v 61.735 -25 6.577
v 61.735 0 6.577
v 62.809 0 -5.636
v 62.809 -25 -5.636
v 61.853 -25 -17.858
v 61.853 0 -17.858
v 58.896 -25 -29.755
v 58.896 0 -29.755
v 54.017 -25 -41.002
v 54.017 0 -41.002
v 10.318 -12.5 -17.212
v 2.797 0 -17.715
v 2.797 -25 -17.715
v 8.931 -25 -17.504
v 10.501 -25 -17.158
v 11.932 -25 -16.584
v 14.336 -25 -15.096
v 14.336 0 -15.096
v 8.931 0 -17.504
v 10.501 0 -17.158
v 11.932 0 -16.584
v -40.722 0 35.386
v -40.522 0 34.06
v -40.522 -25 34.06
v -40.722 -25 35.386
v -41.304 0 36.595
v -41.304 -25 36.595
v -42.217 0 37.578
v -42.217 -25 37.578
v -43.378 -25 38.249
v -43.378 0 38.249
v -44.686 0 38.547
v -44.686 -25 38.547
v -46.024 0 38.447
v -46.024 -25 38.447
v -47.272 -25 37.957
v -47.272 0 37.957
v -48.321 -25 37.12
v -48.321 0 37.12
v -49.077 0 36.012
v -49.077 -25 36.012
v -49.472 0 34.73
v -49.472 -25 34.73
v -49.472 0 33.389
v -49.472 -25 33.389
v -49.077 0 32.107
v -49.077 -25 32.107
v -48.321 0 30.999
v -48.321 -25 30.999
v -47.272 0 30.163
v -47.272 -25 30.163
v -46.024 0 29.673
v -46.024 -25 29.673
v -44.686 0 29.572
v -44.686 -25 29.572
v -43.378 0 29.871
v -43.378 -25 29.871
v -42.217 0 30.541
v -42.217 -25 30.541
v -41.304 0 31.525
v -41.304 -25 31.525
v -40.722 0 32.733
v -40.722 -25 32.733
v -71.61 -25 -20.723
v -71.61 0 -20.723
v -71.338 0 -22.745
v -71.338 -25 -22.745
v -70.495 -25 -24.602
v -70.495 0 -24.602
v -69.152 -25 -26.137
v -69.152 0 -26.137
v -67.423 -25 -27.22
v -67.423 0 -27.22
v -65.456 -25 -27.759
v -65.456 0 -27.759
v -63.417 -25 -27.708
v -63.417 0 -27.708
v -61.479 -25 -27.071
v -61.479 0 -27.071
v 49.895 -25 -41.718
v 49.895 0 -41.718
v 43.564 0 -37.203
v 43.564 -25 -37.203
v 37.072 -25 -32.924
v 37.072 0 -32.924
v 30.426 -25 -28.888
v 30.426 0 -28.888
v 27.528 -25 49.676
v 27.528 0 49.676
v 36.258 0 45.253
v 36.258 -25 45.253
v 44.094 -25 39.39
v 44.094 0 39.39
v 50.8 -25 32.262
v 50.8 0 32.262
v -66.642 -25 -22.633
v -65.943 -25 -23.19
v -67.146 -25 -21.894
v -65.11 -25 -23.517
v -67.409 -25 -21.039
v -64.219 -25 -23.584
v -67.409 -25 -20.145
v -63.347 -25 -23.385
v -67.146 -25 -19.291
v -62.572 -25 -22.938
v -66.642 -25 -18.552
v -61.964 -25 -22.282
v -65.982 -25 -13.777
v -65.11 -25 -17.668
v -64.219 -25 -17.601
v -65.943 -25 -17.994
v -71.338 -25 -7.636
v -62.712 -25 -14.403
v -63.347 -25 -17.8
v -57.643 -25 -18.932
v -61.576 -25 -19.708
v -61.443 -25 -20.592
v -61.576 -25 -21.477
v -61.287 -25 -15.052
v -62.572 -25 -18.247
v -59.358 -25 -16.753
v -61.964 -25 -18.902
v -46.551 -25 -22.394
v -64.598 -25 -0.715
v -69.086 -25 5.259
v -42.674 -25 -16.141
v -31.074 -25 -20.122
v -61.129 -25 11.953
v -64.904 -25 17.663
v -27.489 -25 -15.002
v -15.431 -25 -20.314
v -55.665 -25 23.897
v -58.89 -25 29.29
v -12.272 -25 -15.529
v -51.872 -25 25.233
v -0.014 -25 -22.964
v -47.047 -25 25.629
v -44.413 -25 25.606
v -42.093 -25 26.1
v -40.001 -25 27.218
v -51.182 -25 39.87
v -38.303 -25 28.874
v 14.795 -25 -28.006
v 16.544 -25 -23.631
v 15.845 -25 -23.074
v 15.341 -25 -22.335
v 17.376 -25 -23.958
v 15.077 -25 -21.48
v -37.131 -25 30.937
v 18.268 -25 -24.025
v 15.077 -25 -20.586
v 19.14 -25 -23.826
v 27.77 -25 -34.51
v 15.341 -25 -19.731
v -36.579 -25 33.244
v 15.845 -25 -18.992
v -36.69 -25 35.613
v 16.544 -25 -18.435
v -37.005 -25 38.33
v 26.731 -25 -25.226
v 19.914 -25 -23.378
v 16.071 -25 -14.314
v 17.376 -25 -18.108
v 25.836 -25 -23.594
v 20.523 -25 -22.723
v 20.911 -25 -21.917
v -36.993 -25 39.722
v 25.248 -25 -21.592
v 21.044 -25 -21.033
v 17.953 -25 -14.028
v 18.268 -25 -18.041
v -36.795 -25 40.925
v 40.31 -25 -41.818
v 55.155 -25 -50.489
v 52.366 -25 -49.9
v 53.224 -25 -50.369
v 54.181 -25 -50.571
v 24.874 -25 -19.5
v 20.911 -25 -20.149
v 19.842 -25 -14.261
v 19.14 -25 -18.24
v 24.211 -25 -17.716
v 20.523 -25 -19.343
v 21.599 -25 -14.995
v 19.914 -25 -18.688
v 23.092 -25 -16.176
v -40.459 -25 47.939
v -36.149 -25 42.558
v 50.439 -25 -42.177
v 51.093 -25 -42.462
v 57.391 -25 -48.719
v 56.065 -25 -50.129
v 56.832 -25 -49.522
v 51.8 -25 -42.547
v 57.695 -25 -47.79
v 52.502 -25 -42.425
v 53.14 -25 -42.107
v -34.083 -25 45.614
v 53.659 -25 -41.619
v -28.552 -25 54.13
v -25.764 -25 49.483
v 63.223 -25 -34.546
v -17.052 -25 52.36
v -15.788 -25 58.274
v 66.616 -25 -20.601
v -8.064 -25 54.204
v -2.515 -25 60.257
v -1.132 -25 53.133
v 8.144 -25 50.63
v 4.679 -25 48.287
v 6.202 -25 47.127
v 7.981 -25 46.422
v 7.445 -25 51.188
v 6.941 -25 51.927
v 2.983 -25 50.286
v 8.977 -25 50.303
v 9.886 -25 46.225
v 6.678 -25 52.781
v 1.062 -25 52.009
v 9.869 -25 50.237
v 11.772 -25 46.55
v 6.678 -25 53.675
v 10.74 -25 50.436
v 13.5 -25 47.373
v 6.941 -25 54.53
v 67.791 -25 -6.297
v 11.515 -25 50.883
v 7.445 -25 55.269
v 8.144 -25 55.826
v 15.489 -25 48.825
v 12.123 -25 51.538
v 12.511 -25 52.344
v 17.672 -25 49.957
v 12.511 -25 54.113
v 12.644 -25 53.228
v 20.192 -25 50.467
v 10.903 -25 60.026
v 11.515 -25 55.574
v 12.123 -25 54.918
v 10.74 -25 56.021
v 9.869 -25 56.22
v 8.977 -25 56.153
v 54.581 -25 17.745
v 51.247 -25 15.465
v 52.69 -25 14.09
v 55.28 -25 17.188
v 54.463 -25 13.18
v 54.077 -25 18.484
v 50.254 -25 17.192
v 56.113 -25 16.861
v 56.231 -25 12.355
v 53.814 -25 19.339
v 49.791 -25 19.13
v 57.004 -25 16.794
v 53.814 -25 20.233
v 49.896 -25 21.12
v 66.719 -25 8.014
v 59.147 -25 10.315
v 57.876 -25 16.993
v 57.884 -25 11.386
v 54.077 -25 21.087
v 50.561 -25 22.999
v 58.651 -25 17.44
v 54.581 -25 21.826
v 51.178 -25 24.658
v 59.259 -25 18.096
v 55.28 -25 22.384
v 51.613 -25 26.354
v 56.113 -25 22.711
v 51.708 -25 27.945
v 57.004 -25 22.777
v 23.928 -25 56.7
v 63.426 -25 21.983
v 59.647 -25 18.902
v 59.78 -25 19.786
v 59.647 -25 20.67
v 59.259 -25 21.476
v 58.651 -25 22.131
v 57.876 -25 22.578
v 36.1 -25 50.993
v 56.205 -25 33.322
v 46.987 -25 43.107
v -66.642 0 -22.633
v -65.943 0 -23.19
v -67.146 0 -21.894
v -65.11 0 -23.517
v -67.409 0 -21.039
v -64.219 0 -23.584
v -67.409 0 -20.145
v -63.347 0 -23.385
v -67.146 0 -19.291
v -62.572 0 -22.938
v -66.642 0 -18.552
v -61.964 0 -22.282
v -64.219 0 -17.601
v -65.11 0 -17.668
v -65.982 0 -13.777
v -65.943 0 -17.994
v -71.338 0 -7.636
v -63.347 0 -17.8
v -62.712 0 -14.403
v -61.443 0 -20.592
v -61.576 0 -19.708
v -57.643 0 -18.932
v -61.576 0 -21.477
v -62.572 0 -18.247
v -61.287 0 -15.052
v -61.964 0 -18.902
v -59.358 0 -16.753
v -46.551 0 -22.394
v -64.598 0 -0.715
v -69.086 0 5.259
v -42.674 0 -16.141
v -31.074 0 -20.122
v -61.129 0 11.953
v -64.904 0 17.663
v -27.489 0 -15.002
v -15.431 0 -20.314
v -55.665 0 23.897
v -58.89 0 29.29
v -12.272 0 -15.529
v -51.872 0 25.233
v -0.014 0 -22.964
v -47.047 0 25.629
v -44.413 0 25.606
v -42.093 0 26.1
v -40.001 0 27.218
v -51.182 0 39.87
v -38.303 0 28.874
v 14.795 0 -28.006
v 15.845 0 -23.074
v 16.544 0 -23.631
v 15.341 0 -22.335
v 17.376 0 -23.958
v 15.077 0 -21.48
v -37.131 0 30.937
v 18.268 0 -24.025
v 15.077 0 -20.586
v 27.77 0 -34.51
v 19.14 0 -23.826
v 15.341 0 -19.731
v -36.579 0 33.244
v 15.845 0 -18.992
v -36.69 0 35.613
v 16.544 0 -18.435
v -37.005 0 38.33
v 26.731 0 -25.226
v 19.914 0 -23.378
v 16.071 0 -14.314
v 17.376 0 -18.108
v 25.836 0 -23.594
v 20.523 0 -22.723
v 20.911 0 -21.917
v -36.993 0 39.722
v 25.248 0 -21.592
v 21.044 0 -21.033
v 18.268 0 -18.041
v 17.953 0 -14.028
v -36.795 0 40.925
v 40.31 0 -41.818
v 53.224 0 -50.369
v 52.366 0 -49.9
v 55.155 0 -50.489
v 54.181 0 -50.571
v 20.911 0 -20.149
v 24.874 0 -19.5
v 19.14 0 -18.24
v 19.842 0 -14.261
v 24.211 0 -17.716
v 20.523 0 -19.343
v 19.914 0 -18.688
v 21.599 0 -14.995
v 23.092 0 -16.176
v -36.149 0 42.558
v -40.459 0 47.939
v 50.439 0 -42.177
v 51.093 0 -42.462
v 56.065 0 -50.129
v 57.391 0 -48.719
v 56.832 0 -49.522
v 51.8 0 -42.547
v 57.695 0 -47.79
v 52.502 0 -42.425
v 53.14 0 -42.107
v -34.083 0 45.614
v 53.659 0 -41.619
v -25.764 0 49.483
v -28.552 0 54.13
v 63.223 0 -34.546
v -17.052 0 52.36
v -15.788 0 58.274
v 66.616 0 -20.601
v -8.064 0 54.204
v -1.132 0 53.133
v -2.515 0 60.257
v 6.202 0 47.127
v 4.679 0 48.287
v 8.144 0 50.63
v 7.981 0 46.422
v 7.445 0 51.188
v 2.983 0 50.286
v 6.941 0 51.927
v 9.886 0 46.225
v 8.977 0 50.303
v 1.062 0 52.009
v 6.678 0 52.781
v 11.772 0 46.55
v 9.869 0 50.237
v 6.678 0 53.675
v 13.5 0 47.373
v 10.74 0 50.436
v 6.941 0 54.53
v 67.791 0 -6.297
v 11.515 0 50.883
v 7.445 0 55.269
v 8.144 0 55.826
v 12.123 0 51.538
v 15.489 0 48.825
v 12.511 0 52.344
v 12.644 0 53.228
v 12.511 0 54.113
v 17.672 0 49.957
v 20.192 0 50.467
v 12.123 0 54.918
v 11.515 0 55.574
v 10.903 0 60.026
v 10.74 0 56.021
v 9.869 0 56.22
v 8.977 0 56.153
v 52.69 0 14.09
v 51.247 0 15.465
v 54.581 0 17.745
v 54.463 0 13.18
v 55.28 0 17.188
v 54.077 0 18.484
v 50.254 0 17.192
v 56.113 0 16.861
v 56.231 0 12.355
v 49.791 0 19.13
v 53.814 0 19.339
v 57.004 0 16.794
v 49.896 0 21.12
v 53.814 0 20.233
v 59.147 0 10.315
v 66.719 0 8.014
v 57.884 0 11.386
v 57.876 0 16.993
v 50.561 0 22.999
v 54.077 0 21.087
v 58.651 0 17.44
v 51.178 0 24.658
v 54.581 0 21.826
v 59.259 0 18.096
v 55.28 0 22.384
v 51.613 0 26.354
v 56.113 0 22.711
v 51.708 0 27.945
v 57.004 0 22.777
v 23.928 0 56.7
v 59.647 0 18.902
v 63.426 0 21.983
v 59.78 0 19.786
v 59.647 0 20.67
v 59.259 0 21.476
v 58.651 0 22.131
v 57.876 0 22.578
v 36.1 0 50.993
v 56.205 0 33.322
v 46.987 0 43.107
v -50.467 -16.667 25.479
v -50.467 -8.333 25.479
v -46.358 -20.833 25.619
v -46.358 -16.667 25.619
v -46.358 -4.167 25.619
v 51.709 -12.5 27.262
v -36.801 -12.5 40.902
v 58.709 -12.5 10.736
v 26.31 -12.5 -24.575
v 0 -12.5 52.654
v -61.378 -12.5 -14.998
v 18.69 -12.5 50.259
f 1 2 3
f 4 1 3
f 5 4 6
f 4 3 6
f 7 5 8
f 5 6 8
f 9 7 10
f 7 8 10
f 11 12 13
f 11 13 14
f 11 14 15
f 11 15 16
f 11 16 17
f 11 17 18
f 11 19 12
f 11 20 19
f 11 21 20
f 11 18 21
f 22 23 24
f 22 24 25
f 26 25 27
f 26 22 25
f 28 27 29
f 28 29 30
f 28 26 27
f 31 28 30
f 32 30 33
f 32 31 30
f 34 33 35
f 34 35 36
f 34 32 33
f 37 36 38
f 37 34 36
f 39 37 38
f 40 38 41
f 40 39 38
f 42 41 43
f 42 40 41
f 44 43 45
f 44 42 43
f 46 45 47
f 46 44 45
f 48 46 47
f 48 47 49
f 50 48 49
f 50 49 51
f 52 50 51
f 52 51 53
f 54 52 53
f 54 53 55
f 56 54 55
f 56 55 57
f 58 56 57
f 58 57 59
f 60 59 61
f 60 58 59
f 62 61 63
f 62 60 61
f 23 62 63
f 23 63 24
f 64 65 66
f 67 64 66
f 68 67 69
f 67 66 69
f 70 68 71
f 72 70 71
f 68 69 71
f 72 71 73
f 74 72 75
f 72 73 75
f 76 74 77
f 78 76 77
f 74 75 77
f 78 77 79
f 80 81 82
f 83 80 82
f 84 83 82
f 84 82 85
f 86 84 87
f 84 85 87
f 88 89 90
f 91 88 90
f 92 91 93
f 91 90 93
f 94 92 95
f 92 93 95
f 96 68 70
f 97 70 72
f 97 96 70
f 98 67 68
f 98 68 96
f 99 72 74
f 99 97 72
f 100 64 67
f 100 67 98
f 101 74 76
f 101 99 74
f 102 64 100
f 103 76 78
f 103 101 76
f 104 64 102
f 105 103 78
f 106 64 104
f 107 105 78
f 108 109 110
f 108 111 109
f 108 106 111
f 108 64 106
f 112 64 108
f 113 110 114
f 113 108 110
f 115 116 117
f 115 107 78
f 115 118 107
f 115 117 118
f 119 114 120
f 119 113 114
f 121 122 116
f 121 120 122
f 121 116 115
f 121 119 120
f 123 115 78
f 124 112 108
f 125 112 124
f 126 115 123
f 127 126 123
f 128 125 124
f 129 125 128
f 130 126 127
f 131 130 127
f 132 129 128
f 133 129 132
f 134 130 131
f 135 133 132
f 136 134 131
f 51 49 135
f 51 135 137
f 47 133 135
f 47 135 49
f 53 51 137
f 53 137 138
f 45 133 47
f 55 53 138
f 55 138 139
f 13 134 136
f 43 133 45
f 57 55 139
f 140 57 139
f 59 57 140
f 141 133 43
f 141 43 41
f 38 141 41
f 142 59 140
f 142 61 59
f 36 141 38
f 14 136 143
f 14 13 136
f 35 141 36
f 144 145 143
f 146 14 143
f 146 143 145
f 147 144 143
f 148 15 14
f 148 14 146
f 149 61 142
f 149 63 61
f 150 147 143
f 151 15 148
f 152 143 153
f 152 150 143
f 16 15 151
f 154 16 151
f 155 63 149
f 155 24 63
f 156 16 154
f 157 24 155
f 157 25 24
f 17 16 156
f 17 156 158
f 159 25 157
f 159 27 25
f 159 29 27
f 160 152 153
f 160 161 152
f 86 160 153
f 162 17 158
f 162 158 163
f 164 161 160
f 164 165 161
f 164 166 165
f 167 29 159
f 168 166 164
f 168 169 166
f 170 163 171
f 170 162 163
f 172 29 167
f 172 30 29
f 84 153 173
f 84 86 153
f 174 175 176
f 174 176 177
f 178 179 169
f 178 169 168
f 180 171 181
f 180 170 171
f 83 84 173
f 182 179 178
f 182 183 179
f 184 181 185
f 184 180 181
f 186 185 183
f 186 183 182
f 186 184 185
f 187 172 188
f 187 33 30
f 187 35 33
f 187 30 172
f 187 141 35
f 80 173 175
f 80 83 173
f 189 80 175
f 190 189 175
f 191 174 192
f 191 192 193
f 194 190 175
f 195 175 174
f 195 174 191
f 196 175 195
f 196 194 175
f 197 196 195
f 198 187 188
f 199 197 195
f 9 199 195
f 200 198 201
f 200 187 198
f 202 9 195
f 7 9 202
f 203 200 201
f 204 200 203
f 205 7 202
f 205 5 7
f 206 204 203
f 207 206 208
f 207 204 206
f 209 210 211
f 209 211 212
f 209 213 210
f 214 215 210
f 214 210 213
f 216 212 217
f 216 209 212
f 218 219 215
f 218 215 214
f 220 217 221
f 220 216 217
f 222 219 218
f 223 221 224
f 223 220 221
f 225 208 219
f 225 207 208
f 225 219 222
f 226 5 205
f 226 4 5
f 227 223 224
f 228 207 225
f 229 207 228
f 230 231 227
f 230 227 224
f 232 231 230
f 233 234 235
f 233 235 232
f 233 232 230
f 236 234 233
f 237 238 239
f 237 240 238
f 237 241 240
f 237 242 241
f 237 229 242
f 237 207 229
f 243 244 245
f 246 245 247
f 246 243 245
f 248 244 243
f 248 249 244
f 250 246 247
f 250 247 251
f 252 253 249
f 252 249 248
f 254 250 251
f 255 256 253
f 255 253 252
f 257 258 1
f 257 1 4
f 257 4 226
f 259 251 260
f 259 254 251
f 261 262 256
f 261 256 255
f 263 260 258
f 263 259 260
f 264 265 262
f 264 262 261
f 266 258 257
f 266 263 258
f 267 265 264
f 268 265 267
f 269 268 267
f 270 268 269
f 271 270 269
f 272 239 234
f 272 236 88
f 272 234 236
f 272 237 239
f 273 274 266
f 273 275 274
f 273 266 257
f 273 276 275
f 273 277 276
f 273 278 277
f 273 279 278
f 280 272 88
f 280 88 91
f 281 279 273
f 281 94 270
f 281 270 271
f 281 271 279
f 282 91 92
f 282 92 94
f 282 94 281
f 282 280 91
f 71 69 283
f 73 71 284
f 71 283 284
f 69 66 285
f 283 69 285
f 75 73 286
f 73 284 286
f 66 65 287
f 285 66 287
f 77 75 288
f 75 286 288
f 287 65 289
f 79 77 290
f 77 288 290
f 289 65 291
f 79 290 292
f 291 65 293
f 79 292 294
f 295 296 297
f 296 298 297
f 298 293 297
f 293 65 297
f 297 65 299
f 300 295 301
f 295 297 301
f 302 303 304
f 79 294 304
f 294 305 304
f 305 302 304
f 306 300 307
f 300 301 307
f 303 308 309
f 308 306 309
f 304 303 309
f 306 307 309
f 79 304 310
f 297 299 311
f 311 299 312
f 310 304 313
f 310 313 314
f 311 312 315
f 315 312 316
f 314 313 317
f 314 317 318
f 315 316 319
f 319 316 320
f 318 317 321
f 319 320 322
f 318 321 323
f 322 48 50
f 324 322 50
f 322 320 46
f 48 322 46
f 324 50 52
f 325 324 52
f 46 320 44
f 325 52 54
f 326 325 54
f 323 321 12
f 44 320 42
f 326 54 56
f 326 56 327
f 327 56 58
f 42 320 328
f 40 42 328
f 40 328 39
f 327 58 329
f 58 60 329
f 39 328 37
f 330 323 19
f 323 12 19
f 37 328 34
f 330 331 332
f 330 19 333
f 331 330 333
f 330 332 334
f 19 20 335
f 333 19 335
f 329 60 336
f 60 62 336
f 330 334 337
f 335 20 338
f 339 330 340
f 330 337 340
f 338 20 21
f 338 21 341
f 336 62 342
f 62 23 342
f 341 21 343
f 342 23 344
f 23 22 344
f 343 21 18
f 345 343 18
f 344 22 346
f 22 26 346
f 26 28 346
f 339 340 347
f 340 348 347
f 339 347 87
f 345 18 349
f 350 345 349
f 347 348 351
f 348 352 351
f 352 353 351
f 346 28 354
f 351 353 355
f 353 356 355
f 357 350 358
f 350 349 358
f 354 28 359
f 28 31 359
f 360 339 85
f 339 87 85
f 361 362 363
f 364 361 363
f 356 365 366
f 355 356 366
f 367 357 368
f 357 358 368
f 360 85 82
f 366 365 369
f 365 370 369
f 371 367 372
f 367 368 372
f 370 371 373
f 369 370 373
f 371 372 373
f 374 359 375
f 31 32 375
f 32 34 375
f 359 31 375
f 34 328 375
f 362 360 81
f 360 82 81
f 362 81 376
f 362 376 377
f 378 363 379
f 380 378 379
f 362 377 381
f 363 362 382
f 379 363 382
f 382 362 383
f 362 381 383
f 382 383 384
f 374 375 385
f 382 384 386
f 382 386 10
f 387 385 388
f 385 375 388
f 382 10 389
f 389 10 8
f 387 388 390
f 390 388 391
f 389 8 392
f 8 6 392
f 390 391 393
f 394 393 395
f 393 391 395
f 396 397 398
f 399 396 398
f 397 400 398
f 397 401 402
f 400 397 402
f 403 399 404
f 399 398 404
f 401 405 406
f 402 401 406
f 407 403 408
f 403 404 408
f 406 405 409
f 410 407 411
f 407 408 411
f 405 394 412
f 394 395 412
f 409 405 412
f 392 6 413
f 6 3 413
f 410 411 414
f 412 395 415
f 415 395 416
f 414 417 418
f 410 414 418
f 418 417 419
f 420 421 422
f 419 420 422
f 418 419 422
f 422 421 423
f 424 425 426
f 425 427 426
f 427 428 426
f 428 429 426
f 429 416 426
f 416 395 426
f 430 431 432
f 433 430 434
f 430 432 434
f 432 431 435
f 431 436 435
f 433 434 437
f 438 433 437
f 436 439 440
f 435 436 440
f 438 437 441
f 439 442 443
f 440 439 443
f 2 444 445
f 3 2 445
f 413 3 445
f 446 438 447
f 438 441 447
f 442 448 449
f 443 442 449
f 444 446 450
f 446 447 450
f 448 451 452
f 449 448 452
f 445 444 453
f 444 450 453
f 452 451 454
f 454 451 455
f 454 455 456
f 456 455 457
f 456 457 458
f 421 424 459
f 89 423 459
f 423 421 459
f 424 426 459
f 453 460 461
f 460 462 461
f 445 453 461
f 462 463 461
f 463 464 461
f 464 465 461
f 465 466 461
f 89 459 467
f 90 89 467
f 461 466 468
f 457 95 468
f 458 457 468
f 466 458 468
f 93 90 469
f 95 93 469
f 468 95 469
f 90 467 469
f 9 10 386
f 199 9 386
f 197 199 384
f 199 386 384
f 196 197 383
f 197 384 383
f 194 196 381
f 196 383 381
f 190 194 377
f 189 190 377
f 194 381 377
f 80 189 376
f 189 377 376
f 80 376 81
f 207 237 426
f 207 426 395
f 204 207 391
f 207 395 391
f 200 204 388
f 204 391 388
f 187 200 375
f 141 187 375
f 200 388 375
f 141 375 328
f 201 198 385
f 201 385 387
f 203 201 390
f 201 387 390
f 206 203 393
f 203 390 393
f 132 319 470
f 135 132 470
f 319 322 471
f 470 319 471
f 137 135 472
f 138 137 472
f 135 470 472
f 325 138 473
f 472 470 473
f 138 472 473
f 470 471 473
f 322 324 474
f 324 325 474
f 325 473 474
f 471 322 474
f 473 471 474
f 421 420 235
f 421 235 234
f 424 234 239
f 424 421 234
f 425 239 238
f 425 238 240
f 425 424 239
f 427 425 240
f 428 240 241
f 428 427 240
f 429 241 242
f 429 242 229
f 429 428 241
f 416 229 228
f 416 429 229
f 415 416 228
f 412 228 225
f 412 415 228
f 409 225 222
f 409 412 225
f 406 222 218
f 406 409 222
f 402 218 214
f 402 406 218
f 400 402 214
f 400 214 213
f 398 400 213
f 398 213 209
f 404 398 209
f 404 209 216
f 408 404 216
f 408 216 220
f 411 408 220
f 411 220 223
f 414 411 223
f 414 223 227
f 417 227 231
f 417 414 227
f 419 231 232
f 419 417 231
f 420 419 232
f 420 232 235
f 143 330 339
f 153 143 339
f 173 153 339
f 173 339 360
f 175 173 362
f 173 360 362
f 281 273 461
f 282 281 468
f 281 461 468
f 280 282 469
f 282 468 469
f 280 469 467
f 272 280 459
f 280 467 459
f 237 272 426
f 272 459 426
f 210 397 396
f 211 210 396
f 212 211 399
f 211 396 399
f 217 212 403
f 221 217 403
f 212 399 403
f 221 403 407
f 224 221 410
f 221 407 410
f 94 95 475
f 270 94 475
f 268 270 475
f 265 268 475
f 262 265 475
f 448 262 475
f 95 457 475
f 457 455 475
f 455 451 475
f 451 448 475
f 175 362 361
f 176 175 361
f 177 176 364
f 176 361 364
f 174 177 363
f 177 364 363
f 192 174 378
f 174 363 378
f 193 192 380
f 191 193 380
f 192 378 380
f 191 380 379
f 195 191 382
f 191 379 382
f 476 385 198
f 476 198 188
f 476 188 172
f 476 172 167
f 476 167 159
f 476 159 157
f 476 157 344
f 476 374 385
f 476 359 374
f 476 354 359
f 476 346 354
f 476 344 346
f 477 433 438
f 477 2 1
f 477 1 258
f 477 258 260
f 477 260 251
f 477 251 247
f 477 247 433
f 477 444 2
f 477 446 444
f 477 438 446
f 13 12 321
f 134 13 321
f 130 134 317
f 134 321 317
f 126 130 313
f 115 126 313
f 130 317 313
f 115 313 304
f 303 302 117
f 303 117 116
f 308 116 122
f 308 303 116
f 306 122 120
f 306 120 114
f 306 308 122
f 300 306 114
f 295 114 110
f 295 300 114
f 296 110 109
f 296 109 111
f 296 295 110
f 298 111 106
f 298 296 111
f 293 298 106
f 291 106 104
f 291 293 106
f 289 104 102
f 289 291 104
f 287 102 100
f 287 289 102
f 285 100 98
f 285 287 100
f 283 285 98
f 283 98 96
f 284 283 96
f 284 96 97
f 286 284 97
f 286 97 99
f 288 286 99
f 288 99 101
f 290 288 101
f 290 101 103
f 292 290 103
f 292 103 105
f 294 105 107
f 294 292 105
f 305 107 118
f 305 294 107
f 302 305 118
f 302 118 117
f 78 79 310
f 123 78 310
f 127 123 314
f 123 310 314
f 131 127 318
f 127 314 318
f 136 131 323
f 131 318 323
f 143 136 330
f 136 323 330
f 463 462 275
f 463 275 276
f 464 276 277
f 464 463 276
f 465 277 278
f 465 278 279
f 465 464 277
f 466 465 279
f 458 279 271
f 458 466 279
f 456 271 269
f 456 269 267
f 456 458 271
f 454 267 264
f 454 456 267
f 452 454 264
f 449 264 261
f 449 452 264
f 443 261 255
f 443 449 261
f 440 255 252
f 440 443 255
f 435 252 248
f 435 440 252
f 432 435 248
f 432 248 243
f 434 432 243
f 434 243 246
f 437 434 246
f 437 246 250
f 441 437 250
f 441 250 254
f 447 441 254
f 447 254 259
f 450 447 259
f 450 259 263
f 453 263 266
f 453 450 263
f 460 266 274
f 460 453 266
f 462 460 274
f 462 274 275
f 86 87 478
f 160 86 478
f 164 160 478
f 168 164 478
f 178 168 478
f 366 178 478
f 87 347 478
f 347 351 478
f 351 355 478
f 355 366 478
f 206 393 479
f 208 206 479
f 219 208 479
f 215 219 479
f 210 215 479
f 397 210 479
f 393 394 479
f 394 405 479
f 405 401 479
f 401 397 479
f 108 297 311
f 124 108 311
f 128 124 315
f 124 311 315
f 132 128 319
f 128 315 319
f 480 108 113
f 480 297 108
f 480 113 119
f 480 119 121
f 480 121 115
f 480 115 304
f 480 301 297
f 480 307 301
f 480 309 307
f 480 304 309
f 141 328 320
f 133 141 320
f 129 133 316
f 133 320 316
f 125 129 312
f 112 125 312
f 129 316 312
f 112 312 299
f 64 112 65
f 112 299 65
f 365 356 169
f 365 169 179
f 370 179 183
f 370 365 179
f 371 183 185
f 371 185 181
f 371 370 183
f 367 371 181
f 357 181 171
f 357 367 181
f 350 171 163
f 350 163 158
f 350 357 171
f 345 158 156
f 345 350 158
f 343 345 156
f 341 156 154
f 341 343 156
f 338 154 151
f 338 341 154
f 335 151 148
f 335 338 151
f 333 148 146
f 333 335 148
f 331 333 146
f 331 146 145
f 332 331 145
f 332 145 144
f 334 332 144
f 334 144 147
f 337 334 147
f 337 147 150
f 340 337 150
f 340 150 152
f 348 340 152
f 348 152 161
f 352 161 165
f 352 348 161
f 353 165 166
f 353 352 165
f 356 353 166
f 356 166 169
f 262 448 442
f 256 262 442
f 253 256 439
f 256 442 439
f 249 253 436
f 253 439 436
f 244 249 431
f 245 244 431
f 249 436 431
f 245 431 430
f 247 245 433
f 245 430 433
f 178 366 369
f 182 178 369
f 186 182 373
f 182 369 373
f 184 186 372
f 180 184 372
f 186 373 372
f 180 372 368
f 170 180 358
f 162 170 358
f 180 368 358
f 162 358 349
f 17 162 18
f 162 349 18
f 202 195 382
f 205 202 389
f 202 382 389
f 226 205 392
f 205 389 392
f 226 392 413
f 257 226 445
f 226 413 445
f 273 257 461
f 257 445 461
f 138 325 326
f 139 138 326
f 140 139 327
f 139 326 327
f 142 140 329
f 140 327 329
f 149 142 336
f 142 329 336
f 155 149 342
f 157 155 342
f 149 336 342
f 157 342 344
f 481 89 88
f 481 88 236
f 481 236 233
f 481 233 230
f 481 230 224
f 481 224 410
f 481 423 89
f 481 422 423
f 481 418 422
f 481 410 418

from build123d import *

# Parameters (mm, degrees)
F0_R     = 3
F0_R_2   = 4.5
F1_DEPTH = 25


with BuildPart() as f1:
    # F0 (on Front) → F1 (new body)
    with BuildSketch(Plane.XZ):
        with BuildLine():
            ThreePointArc((10.9026810919, 60.0256923786), (-22.2558754476, 56.4666978044), (-51.1818335692, 39.870154161))
            ThreePointArc((-51.1818335692, 39.870154161), (-67.2310606154, 11.5408714989), (-71.6096891644, -20.7229403799))
            ThreePointArc((-71.6096891644, -20.7229403799), (-68.3273517642, -26.7421593589), (-61.4792606521, -27.0713766838))
            ThreePointArc((-61.4792606521, -27.0713766838), (-23.2487235956, -19.9089821225), (14.7948054645, -28.00612706))
            ThreePointArc((14.7948054645, -28.00612706), (34.09763812, -38.0650715452), (52.3656483576, -49.8998302939))
            ThreePointArc((52.3656483576, -49.8998302939), (55.6232730928, -50.3420263302), (57.6954634801, -47.7898344783))
            ThreePointArc((57.6954634801, -47.7898344783), (67.4841016349, -13.4719946795), (63.4264131289, 21.9831421749))
            ThreePointArc((63.4264131289, 21.9831421749), (41.7291215347, 47.3065311635), (10.9026810919, 60.0256923786))
        make_face()
        with Locations((-64.4427245231, -20.592329134)):
            Circle(F0_R, mode=Mode.SUBTRACT)
        with Locations((18.0438014374, -21.0330026143)):
            Circle(F0_R, mode=Mode.SUBTRACT)
        with Locations((-45.0222906279, 34.0597224955)):
            Circle(F0_R_2, mode=Mode.SUBTRACT)
        with BuildLine():
            add(Edge.make_bspline(
                [(-65.9818429495, -13.7766383887), (-64.3561406503, -13.9889919324), (-61.002475647, -14.4129805983), (-58.786662695, -17.3941098492), (-57.6425891256, -18.9315586575)],
                knots=[0, 0, 0, 0, 0.4837523045, 1, 1, 1, 1], degree=3))
            ThreePointArc((-65.9818429495, -13.7766383887), (-63.1199927656, 5.6889897511), (-55.6653674819, 23.8969393125))
            add(Edge.make_bspline(
                [(-55.6653674819, 23.8969393125), (-54.1157834703, 24.558722907), (-50.9743628562, 25.897077509), (-44.9169668051, 25.5411930836), (-44.499564984, 25.5987820264), (-44.4126954758, 25.6059592173)],
                knots=[0, 0, 0, 0, 0.4368464907, 0.8829086428, 1, 1, 1, 1], degree=3))
            ThreePointArc((-44.4126954758, 25.6059592173), (-38.3027773263, 28.8742935487), (-36.6900921562, 35.6131625664))
            add(Edge.make_bspline(
                [(-34.08346527, 45.6139450583), (-35.2318735073, 44.1052978146), (-37.495431158, 41.0832942182), (-36.9568434928, 37.4300314786), (-36.6900921562, 35.6131625664)],
                knots=[0, 0, 0, 0, 0.5034654691, 1, 1, 1, 1], degree=3))
            ThreePointArc((-34.08346527, 45.6139450583), (-21.4497726915, 51.0485334301), (-8.0636271487, 54.2038537692))
            add(Edge.make_bspline(
                [(-8.0636271487, 54.2038537692), (-5.1314488098, 53.9873966847), (0.3914162184, 53.5818086349), (3.3084081042, 49.9752607352), (4.6788664975, 48.2869338255)],
                knots=[0, 0, 0, 0, 0.5311112281, 1, 1, 1, 1], degree=3))
            ThreePointArc((4.6788664975, 48.2869338255), (8.9267083452, 46.2578656633), (13.5002491076, 47.3732144268))
            add(Edge.make_bspline(
                [(27.5275195375, 49.6756181297), (24.3589504651, 50.2644097694), (18.5753078163, 51.2779486411), (15.0780756623, 48.5877160028), (13.5002491076, 47.3732144268)],
                knots=[0, 0, 0, 0, 0.5497885765, 1, 1, 1, 1], degree=3))
            ThreePointArc((27.5275195375, 49.6756181297), (40.3031395338, 42.4916724249), (50.800144894, 32.2623801401))
            add(Edge.make_bspline(
                [(50.800144894, 32.2623801401), (51.3048604695, 30.5691603197), (52.2209505288, 27.262036777), (51.106083954, 24.3879103118), (50.5611791748, 22.9987592368)],
                knots=[0, 0, 0, 0, 0.5176067222, 1, 1, 1, 1], degree=3))
            ThreePointArc((50.5611791748, 22.9987592368), (50.2536306678, 17.192161847), (54.4628675293, 13.1804933194))
            add(Edge.make_bspline(
                [(61.7354629672, 6.576572241), (60.8612124825, 8.1098386582), (59.0540175823, 11.1146660647), (55.9863654121, 12.4994575374), (54.4628675293, 13.1804933194)],
                knots=[0, 0, 0, 0, 0.5060903587, 1, 1, 1, 1], degree=3))
            ThreePointArc((61.7354629672, 6.576572241), (61.8532031721, -17.8580596689), (54.0168535043, -41.0023186376))
            ThreePointArc((54.0168535043, -41.0023186376), (52.1556490377, -42.5112346478), (49.8949177563, -41.7175069451))
            ThreePointArc((49.8949177563, -41.7175069451), (40.3376909972, -35.0336152353), (30.4260621775, -28.8875103016))
            add(Edge.make_bspline(
                [(30.4260621775, -28.8875103016), (28.8541001513, -27.5081560411), (25.7225858464, -24.9527524994), (25.163523259, -21.2699310006), (24.8738721868, -19.4999880815)],
                knots=[0, 0, 0, 0, 0.5153021573, 1, 1, 1, 1], degree=3))
            ThreePointArc((24.8738721868, -19.4999880815), (20.7454507325, -14.5683653438), (14.3355783244, -15.0959089361))
            add(Edge.make_bspline(
                [(2.7973287746, -17.7149148802), (5.5242069664, -17.7559248974), (10.3675947849, -17.828765488), (13.1289117857, -15.9269725037), (14.3355783244, -15.0959089361)],
                knots=[0, 0, 0, 0, 0.5630104988, 1, 1, 1, 1], degree=3))
            ThreePointArc((2.7973287746, -17.7149148802), (-27.4894908213, -15.0017617251), (-57.6425891256, -18.9315586575))
        make_face(mode=Mode.SUBTRACT)
        with Locations((56.7802422866, 19.7857771311)):
            Circle(F0_R, mode=Mode.SUBTRACT)
        with Locations((9.6443155061, 53.228250787)):
            Circle(F0_R, mode=Mode.SUBTRACT)
    extrude(amount=F1_DEPTH)


solid = f1.part
